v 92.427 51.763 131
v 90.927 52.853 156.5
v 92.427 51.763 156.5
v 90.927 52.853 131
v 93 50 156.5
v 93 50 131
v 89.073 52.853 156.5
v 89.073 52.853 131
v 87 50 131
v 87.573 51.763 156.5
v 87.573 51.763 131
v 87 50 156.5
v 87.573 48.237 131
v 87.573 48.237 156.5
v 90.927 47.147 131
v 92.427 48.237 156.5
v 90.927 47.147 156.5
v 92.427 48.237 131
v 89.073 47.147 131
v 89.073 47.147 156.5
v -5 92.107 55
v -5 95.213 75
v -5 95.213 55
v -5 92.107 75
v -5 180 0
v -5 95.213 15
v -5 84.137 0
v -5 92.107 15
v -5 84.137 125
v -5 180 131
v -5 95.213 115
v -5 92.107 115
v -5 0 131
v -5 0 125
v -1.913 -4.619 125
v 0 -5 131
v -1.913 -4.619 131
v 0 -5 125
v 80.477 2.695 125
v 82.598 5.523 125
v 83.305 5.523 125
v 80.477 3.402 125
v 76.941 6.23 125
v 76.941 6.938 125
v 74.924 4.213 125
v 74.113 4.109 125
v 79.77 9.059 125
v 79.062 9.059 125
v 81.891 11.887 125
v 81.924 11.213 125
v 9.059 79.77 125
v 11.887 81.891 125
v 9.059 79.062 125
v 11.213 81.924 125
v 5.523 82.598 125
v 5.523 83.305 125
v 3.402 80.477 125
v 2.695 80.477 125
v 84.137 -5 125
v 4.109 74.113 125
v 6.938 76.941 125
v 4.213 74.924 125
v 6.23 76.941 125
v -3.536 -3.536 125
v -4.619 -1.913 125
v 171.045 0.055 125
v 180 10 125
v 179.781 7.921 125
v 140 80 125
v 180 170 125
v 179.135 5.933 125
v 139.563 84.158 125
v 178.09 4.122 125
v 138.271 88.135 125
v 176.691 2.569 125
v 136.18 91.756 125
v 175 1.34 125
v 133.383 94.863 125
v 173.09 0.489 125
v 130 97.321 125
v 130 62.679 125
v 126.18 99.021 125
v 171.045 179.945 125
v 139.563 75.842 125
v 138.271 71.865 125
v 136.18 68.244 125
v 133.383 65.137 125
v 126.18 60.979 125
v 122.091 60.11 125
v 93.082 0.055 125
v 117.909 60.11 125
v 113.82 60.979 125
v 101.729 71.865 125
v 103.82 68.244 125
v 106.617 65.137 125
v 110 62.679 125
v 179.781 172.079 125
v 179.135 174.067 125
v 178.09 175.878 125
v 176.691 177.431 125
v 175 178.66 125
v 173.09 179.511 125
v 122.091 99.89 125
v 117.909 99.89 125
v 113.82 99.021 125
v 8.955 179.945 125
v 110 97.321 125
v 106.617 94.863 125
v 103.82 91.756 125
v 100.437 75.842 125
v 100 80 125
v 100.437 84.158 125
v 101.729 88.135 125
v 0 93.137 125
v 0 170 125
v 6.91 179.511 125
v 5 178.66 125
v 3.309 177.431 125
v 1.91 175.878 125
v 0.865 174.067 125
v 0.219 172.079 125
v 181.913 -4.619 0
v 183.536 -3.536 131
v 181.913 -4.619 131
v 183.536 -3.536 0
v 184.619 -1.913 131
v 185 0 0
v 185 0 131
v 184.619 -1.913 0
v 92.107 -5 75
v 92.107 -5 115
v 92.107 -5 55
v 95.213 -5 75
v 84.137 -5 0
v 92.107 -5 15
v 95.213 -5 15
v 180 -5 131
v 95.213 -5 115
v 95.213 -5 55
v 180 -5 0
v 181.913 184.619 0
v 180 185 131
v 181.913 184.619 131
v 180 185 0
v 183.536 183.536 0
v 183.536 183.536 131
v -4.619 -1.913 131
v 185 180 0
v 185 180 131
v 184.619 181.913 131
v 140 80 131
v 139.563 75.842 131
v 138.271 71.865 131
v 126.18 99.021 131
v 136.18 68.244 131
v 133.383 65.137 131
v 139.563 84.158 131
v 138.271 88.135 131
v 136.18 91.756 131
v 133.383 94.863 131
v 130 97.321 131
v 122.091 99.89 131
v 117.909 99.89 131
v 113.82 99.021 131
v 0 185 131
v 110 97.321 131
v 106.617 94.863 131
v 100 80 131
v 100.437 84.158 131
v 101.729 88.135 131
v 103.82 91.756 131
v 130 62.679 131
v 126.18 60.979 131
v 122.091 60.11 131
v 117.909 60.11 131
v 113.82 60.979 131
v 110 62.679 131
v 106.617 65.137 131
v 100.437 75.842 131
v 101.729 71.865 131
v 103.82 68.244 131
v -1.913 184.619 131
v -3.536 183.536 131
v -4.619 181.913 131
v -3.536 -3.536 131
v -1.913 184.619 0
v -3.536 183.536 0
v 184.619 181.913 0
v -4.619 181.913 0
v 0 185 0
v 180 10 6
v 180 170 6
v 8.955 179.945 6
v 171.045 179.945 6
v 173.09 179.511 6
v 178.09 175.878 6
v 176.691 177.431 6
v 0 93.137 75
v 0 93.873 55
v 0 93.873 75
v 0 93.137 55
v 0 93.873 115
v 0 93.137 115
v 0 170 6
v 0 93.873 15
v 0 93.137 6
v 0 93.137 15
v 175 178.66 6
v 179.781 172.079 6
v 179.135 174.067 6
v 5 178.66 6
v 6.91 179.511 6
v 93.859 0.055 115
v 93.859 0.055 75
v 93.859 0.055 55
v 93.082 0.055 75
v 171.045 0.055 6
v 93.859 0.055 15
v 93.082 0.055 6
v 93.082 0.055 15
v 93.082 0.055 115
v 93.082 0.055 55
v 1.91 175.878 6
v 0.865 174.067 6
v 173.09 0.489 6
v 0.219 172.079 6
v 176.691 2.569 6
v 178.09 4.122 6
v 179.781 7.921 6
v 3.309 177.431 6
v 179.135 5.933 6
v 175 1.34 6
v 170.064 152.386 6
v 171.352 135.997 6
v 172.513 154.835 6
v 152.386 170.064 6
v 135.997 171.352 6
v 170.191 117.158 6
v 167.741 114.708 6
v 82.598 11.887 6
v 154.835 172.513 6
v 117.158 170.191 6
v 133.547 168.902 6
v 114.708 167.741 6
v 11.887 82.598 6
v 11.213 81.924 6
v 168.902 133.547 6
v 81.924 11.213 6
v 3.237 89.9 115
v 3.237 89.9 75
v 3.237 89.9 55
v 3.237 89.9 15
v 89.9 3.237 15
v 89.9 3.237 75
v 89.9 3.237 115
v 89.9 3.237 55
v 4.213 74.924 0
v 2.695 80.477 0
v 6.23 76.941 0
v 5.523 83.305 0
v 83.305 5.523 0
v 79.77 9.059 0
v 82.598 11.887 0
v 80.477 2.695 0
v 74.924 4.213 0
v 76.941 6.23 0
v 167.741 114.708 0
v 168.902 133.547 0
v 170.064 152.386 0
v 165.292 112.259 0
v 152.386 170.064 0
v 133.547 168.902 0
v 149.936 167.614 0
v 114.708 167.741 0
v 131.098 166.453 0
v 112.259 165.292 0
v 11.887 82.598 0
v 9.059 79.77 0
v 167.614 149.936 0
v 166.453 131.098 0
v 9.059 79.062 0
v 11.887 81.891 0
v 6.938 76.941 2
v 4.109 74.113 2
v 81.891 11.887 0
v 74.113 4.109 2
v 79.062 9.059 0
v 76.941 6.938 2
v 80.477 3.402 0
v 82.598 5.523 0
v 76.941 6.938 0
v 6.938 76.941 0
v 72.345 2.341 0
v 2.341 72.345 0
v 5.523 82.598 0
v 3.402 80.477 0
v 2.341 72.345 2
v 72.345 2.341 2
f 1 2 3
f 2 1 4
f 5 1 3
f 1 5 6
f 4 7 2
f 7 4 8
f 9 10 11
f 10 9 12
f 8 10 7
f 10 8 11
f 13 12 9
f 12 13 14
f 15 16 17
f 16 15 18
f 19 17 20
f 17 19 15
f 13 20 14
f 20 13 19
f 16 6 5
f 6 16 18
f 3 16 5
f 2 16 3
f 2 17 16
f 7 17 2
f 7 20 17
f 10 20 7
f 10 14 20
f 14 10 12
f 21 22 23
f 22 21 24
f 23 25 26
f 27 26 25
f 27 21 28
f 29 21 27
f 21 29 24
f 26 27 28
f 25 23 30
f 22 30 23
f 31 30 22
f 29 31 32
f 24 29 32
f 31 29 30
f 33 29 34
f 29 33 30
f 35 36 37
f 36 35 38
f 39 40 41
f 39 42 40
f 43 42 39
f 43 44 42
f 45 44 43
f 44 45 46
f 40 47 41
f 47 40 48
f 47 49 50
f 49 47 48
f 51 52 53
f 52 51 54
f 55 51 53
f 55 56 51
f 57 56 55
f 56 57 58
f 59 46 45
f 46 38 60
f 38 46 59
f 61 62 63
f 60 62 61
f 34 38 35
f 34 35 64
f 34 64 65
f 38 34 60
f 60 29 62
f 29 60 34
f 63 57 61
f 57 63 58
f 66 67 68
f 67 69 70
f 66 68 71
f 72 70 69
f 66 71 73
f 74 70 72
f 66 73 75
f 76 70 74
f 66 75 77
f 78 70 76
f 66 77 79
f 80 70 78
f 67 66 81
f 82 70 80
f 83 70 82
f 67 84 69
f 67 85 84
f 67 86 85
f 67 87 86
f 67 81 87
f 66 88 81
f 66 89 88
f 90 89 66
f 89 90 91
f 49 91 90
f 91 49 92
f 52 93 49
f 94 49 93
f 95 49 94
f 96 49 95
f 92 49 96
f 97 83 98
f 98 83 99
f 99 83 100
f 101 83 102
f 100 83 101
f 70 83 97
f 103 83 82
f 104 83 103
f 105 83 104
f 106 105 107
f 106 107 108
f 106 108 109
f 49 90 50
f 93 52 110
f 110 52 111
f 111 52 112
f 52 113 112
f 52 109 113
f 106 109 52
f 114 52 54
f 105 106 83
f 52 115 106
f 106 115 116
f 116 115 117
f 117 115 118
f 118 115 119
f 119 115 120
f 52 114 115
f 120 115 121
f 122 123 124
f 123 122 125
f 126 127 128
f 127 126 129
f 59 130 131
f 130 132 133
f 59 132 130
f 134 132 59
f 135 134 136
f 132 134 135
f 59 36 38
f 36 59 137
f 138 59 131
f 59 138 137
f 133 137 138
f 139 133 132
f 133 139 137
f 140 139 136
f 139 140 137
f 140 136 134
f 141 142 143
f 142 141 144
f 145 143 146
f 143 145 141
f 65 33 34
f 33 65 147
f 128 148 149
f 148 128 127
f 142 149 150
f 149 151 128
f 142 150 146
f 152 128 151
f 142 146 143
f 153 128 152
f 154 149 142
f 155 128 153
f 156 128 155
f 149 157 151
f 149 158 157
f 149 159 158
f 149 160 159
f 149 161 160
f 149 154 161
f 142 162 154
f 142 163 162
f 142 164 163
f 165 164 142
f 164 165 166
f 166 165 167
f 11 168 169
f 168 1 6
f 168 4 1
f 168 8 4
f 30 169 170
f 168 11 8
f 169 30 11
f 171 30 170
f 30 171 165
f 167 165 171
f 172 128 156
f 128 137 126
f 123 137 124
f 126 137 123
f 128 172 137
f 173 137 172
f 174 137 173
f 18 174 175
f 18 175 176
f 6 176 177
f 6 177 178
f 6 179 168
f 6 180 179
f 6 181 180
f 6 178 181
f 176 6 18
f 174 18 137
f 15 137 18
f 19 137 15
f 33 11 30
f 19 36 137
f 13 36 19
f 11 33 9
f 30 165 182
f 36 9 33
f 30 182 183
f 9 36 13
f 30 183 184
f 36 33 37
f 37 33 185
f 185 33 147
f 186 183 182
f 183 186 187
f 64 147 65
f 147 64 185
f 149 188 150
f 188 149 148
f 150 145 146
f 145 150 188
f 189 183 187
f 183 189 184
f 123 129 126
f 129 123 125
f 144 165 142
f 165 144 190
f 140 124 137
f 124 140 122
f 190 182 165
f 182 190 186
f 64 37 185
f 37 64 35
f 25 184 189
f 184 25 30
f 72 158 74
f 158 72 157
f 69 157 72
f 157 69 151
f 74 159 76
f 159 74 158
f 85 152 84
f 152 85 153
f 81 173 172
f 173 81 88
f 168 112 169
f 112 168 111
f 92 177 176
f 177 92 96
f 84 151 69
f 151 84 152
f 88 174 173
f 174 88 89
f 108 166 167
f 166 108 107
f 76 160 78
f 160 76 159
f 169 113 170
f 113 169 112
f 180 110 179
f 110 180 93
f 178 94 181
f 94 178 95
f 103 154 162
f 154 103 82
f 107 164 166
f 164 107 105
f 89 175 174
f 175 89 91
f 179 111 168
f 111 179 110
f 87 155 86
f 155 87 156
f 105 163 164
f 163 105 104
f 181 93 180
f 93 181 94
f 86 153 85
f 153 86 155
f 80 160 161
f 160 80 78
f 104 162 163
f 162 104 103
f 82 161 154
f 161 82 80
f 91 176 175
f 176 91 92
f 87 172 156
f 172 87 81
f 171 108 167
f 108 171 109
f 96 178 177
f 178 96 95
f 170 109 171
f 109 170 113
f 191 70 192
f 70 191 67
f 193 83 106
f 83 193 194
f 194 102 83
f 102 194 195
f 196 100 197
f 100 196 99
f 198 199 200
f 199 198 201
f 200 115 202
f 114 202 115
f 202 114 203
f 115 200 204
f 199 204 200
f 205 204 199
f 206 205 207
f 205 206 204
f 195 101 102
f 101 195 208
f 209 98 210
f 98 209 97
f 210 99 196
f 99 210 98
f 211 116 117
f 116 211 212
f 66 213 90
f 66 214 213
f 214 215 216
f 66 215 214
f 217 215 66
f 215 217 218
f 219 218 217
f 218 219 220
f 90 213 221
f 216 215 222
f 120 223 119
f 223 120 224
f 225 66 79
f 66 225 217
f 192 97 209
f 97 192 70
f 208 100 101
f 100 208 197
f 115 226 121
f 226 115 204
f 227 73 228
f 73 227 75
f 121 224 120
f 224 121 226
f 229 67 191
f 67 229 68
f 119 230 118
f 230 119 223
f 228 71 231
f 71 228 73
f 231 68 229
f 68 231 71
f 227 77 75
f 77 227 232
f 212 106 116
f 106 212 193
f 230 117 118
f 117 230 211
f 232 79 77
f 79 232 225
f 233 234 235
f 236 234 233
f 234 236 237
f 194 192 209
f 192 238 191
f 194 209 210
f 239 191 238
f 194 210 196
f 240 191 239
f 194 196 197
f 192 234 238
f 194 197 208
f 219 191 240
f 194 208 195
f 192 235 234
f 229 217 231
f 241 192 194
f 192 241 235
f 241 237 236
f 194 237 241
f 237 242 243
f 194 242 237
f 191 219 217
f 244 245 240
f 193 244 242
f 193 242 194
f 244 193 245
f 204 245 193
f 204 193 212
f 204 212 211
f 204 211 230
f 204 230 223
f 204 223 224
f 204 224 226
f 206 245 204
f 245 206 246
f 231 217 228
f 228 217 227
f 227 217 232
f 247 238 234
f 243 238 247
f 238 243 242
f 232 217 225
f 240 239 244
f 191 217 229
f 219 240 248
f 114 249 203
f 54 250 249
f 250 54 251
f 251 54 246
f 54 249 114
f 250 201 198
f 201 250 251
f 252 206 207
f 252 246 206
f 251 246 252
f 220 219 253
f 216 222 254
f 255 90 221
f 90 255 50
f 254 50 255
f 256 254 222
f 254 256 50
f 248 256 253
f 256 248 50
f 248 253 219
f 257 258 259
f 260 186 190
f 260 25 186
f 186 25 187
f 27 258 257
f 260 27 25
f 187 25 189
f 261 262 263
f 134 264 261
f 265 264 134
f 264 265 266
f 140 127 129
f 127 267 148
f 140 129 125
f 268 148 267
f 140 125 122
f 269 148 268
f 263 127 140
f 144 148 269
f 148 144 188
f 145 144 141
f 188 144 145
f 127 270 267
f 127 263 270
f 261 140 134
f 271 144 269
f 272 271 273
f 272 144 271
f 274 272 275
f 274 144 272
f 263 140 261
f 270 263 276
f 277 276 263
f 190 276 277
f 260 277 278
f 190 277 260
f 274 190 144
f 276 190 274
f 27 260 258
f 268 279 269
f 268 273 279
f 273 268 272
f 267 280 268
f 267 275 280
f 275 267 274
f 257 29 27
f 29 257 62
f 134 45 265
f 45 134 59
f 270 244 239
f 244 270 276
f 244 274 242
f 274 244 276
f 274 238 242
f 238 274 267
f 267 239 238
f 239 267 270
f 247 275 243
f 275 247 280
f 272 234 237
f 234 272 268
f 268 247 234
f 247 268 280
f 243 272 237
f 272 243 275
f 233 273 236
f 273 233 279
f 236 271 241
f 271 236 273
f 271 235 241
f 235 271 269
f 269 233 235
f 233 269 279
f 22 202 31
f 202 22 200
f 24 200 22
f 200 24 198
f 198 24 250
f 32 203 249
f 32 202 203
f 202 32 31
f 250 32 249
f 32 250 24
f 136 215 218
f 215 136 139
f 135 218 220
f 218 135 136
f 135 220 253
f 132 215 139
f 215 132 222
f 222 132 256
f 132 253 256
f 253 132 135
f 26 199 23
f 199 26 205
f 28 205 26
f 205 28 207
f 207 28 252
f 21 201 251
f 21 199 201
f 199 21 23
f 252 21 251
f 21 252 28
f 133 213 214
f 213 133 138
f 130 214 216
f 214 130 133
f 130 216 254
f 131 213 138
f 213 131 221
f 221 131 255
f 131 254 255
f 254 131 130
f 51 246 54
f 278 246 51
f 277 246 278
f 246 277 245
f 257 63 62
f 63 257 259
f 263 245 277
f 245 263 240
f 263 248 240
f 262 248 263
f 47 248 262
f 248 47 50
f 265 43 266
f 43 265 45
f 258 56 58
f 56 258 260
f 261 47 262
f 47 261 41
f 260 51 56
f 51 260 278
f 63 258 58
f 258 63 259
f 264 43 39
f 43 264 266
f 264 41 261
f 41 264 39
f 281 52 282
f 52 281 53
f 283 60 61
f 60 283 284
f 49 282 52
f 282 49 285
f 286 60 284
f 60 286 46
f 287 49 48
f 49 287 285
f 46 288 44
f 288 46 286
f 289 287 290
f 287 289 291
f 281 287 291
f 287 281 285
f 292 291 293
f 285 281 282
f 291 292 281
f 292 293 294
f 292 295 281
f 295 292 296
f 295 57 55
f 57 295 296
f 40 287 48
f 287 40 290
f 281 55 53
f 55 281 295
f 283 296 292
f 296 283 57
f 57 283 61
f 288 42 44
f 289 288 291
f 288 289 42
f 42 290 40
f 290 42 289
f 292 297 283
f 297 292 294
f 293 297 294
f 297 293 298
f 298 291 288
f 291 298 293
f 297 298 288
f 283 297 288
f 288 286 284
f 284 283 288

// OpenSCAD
// [FL_INDEX: keywords="openscad, 3d_parametric, 3D-Printed_Birdhouse__A_Sign, csg_solid" | COT="Parametric OpenSCAD design from 3DCodeverse"]
// Title: 3D-Printed Birdhouse, A Sign

/* [Global] */

// Which part would you like to make?
part = "a"; // [a:Assembled (without mount),d:Decoration,f:Front,b:Back,p:Plate,m:Mount]

// How much gap (microns) should be left between fitting, unattached, parts?
microngap = 50; // [10:200]

// What diameter (mm) should the entry hole in the decoration or front have?
entrydia = 40; // [20:60]

// How tall (mm) should the mount be?
mounttall = 50; // [25:100]


/* [Hidden] */


module decor() {
	difference() {
		union () {
			translate([-20,-90,0]) {
				linear_extrude(height = 2.5) import("decor.dxf");
			}
			translate([90,50,0.5]) cylinder(h=26, r=3);
		}
		translate([120,80,-23]) cylinder(h=100, r=entrydia/2);
	}
}

module front() {
	difference() {
		union () {
			minkowski() {
				cube(size=[180,180,4]);
				cylinder(h=2, r=5);
			}
			translate([0,0,5]) decor();
		}
		translate([120,80,-23]) cylinder(h=100, r=entrydia/2);
	}
}

module plainback() {
	difference() {
		minkowski() {
			cube(size=[180,180,125-2]);
			cylinder(h=2, r=5);
		}
		difference() {
			translate([10,10,6]) minkowski() {
				cube(size=[160,160,390]);
				cylinder(h=2, r=10);
			}
			translate([-10,-10,-20]) rotate([0,0,45])
				cube(size=[160,160,350], center=true);

		}
		translate([-17,-17,-70]) rotate([0,0,45])
			cube(size=[160,160,500], center=true);

		// air vents
		translate([140,140,0]) rotate([0,-60,45]) cube(size=[25,75,3], center=true);
		translate([150,150,0]) rotate([0,-60,45]) cube(size=[25,50,3], center=true);
		translate([160,160,0]) rotate([0,-60,45]) cube(size=[25,25,3], center=true);

		// base drain
		translate([-10,95,95]) rotate([-30,90,45]) cube(size=[40,50,3], center=true);
		translate([95,-10,35]) rotate([30,90,45]) cube(size=[40,50,3], center=true);
		translate([-10,95,35]) rotate([-30,90,45]) cube(size=[40,50,3], center=true);
		translate([95,-10,95]) rotate([30,90,45]) cube(size=[40,50,3], center=true);
	}
}

module back() {
	union() {
		difference() {
			// the back design without removable floor
			plainback();

			// remove mounting/clean-out plate
			translate([43,43,54.9]) rotate([270,180,-45]) union() {
				cube(size=[100,150,12], center=true);	
				cube(size=[110,150,4], center=true);
			}
		}

		// Dietz 2013 inside
		translate([55,200,1]) rotate([0,0,-45])
		linear_extrude(height = 6) import("logo.dxf", center=true);
	}
}

module plate(tol=0.4) {
	// mounting/clean-out plate
	// could difference cylinders for mounting holes from this,
	// but it isn't clear what the mounting holes should be
	union() {
		// the plate itself...
		translate([43,43,125/2]) rotate([270,180,-45]) union() {
			cube(size=[100-(tol*2),125,12-(tol*2)], center=true);	
			cube(size=[110-(tol*2),125,4-(tol*2)], center=true);
		}

		// with 2x2mm tab for easier removal
		translate([43,43,1]) rotate([270,180,-45])
			translate([0,0,-4]) cube(size=[100-(tol*2),2,8], center=true);
	}
}

module assembled(tol=0.4) {
	// tolerance is gap for fitting plate
	union() {
		// each piece is defined in printing position,
		// but front() must be translated to make complete model
		translate([0,0,125]) front();
		back();
		plate(tol);
	}
}

module mount(tall=50) {
	// there were issues with the DXF file...
	// simply rescale the STL
	scale([1,1,tall/50])
	import(file="mount.stl");
}


print_part();

module print_part() {
	if (part == "d") {
		decor();
	} else if (part == "f") {
		front();
	} else if (part == "b") {
		back();
	} else if (part == "p") {
		plate(microngap / 100);
	} else if (part == "m") {
		mount(mounttall);
	} else {
		assembled(microngap / 100);
	}
}
